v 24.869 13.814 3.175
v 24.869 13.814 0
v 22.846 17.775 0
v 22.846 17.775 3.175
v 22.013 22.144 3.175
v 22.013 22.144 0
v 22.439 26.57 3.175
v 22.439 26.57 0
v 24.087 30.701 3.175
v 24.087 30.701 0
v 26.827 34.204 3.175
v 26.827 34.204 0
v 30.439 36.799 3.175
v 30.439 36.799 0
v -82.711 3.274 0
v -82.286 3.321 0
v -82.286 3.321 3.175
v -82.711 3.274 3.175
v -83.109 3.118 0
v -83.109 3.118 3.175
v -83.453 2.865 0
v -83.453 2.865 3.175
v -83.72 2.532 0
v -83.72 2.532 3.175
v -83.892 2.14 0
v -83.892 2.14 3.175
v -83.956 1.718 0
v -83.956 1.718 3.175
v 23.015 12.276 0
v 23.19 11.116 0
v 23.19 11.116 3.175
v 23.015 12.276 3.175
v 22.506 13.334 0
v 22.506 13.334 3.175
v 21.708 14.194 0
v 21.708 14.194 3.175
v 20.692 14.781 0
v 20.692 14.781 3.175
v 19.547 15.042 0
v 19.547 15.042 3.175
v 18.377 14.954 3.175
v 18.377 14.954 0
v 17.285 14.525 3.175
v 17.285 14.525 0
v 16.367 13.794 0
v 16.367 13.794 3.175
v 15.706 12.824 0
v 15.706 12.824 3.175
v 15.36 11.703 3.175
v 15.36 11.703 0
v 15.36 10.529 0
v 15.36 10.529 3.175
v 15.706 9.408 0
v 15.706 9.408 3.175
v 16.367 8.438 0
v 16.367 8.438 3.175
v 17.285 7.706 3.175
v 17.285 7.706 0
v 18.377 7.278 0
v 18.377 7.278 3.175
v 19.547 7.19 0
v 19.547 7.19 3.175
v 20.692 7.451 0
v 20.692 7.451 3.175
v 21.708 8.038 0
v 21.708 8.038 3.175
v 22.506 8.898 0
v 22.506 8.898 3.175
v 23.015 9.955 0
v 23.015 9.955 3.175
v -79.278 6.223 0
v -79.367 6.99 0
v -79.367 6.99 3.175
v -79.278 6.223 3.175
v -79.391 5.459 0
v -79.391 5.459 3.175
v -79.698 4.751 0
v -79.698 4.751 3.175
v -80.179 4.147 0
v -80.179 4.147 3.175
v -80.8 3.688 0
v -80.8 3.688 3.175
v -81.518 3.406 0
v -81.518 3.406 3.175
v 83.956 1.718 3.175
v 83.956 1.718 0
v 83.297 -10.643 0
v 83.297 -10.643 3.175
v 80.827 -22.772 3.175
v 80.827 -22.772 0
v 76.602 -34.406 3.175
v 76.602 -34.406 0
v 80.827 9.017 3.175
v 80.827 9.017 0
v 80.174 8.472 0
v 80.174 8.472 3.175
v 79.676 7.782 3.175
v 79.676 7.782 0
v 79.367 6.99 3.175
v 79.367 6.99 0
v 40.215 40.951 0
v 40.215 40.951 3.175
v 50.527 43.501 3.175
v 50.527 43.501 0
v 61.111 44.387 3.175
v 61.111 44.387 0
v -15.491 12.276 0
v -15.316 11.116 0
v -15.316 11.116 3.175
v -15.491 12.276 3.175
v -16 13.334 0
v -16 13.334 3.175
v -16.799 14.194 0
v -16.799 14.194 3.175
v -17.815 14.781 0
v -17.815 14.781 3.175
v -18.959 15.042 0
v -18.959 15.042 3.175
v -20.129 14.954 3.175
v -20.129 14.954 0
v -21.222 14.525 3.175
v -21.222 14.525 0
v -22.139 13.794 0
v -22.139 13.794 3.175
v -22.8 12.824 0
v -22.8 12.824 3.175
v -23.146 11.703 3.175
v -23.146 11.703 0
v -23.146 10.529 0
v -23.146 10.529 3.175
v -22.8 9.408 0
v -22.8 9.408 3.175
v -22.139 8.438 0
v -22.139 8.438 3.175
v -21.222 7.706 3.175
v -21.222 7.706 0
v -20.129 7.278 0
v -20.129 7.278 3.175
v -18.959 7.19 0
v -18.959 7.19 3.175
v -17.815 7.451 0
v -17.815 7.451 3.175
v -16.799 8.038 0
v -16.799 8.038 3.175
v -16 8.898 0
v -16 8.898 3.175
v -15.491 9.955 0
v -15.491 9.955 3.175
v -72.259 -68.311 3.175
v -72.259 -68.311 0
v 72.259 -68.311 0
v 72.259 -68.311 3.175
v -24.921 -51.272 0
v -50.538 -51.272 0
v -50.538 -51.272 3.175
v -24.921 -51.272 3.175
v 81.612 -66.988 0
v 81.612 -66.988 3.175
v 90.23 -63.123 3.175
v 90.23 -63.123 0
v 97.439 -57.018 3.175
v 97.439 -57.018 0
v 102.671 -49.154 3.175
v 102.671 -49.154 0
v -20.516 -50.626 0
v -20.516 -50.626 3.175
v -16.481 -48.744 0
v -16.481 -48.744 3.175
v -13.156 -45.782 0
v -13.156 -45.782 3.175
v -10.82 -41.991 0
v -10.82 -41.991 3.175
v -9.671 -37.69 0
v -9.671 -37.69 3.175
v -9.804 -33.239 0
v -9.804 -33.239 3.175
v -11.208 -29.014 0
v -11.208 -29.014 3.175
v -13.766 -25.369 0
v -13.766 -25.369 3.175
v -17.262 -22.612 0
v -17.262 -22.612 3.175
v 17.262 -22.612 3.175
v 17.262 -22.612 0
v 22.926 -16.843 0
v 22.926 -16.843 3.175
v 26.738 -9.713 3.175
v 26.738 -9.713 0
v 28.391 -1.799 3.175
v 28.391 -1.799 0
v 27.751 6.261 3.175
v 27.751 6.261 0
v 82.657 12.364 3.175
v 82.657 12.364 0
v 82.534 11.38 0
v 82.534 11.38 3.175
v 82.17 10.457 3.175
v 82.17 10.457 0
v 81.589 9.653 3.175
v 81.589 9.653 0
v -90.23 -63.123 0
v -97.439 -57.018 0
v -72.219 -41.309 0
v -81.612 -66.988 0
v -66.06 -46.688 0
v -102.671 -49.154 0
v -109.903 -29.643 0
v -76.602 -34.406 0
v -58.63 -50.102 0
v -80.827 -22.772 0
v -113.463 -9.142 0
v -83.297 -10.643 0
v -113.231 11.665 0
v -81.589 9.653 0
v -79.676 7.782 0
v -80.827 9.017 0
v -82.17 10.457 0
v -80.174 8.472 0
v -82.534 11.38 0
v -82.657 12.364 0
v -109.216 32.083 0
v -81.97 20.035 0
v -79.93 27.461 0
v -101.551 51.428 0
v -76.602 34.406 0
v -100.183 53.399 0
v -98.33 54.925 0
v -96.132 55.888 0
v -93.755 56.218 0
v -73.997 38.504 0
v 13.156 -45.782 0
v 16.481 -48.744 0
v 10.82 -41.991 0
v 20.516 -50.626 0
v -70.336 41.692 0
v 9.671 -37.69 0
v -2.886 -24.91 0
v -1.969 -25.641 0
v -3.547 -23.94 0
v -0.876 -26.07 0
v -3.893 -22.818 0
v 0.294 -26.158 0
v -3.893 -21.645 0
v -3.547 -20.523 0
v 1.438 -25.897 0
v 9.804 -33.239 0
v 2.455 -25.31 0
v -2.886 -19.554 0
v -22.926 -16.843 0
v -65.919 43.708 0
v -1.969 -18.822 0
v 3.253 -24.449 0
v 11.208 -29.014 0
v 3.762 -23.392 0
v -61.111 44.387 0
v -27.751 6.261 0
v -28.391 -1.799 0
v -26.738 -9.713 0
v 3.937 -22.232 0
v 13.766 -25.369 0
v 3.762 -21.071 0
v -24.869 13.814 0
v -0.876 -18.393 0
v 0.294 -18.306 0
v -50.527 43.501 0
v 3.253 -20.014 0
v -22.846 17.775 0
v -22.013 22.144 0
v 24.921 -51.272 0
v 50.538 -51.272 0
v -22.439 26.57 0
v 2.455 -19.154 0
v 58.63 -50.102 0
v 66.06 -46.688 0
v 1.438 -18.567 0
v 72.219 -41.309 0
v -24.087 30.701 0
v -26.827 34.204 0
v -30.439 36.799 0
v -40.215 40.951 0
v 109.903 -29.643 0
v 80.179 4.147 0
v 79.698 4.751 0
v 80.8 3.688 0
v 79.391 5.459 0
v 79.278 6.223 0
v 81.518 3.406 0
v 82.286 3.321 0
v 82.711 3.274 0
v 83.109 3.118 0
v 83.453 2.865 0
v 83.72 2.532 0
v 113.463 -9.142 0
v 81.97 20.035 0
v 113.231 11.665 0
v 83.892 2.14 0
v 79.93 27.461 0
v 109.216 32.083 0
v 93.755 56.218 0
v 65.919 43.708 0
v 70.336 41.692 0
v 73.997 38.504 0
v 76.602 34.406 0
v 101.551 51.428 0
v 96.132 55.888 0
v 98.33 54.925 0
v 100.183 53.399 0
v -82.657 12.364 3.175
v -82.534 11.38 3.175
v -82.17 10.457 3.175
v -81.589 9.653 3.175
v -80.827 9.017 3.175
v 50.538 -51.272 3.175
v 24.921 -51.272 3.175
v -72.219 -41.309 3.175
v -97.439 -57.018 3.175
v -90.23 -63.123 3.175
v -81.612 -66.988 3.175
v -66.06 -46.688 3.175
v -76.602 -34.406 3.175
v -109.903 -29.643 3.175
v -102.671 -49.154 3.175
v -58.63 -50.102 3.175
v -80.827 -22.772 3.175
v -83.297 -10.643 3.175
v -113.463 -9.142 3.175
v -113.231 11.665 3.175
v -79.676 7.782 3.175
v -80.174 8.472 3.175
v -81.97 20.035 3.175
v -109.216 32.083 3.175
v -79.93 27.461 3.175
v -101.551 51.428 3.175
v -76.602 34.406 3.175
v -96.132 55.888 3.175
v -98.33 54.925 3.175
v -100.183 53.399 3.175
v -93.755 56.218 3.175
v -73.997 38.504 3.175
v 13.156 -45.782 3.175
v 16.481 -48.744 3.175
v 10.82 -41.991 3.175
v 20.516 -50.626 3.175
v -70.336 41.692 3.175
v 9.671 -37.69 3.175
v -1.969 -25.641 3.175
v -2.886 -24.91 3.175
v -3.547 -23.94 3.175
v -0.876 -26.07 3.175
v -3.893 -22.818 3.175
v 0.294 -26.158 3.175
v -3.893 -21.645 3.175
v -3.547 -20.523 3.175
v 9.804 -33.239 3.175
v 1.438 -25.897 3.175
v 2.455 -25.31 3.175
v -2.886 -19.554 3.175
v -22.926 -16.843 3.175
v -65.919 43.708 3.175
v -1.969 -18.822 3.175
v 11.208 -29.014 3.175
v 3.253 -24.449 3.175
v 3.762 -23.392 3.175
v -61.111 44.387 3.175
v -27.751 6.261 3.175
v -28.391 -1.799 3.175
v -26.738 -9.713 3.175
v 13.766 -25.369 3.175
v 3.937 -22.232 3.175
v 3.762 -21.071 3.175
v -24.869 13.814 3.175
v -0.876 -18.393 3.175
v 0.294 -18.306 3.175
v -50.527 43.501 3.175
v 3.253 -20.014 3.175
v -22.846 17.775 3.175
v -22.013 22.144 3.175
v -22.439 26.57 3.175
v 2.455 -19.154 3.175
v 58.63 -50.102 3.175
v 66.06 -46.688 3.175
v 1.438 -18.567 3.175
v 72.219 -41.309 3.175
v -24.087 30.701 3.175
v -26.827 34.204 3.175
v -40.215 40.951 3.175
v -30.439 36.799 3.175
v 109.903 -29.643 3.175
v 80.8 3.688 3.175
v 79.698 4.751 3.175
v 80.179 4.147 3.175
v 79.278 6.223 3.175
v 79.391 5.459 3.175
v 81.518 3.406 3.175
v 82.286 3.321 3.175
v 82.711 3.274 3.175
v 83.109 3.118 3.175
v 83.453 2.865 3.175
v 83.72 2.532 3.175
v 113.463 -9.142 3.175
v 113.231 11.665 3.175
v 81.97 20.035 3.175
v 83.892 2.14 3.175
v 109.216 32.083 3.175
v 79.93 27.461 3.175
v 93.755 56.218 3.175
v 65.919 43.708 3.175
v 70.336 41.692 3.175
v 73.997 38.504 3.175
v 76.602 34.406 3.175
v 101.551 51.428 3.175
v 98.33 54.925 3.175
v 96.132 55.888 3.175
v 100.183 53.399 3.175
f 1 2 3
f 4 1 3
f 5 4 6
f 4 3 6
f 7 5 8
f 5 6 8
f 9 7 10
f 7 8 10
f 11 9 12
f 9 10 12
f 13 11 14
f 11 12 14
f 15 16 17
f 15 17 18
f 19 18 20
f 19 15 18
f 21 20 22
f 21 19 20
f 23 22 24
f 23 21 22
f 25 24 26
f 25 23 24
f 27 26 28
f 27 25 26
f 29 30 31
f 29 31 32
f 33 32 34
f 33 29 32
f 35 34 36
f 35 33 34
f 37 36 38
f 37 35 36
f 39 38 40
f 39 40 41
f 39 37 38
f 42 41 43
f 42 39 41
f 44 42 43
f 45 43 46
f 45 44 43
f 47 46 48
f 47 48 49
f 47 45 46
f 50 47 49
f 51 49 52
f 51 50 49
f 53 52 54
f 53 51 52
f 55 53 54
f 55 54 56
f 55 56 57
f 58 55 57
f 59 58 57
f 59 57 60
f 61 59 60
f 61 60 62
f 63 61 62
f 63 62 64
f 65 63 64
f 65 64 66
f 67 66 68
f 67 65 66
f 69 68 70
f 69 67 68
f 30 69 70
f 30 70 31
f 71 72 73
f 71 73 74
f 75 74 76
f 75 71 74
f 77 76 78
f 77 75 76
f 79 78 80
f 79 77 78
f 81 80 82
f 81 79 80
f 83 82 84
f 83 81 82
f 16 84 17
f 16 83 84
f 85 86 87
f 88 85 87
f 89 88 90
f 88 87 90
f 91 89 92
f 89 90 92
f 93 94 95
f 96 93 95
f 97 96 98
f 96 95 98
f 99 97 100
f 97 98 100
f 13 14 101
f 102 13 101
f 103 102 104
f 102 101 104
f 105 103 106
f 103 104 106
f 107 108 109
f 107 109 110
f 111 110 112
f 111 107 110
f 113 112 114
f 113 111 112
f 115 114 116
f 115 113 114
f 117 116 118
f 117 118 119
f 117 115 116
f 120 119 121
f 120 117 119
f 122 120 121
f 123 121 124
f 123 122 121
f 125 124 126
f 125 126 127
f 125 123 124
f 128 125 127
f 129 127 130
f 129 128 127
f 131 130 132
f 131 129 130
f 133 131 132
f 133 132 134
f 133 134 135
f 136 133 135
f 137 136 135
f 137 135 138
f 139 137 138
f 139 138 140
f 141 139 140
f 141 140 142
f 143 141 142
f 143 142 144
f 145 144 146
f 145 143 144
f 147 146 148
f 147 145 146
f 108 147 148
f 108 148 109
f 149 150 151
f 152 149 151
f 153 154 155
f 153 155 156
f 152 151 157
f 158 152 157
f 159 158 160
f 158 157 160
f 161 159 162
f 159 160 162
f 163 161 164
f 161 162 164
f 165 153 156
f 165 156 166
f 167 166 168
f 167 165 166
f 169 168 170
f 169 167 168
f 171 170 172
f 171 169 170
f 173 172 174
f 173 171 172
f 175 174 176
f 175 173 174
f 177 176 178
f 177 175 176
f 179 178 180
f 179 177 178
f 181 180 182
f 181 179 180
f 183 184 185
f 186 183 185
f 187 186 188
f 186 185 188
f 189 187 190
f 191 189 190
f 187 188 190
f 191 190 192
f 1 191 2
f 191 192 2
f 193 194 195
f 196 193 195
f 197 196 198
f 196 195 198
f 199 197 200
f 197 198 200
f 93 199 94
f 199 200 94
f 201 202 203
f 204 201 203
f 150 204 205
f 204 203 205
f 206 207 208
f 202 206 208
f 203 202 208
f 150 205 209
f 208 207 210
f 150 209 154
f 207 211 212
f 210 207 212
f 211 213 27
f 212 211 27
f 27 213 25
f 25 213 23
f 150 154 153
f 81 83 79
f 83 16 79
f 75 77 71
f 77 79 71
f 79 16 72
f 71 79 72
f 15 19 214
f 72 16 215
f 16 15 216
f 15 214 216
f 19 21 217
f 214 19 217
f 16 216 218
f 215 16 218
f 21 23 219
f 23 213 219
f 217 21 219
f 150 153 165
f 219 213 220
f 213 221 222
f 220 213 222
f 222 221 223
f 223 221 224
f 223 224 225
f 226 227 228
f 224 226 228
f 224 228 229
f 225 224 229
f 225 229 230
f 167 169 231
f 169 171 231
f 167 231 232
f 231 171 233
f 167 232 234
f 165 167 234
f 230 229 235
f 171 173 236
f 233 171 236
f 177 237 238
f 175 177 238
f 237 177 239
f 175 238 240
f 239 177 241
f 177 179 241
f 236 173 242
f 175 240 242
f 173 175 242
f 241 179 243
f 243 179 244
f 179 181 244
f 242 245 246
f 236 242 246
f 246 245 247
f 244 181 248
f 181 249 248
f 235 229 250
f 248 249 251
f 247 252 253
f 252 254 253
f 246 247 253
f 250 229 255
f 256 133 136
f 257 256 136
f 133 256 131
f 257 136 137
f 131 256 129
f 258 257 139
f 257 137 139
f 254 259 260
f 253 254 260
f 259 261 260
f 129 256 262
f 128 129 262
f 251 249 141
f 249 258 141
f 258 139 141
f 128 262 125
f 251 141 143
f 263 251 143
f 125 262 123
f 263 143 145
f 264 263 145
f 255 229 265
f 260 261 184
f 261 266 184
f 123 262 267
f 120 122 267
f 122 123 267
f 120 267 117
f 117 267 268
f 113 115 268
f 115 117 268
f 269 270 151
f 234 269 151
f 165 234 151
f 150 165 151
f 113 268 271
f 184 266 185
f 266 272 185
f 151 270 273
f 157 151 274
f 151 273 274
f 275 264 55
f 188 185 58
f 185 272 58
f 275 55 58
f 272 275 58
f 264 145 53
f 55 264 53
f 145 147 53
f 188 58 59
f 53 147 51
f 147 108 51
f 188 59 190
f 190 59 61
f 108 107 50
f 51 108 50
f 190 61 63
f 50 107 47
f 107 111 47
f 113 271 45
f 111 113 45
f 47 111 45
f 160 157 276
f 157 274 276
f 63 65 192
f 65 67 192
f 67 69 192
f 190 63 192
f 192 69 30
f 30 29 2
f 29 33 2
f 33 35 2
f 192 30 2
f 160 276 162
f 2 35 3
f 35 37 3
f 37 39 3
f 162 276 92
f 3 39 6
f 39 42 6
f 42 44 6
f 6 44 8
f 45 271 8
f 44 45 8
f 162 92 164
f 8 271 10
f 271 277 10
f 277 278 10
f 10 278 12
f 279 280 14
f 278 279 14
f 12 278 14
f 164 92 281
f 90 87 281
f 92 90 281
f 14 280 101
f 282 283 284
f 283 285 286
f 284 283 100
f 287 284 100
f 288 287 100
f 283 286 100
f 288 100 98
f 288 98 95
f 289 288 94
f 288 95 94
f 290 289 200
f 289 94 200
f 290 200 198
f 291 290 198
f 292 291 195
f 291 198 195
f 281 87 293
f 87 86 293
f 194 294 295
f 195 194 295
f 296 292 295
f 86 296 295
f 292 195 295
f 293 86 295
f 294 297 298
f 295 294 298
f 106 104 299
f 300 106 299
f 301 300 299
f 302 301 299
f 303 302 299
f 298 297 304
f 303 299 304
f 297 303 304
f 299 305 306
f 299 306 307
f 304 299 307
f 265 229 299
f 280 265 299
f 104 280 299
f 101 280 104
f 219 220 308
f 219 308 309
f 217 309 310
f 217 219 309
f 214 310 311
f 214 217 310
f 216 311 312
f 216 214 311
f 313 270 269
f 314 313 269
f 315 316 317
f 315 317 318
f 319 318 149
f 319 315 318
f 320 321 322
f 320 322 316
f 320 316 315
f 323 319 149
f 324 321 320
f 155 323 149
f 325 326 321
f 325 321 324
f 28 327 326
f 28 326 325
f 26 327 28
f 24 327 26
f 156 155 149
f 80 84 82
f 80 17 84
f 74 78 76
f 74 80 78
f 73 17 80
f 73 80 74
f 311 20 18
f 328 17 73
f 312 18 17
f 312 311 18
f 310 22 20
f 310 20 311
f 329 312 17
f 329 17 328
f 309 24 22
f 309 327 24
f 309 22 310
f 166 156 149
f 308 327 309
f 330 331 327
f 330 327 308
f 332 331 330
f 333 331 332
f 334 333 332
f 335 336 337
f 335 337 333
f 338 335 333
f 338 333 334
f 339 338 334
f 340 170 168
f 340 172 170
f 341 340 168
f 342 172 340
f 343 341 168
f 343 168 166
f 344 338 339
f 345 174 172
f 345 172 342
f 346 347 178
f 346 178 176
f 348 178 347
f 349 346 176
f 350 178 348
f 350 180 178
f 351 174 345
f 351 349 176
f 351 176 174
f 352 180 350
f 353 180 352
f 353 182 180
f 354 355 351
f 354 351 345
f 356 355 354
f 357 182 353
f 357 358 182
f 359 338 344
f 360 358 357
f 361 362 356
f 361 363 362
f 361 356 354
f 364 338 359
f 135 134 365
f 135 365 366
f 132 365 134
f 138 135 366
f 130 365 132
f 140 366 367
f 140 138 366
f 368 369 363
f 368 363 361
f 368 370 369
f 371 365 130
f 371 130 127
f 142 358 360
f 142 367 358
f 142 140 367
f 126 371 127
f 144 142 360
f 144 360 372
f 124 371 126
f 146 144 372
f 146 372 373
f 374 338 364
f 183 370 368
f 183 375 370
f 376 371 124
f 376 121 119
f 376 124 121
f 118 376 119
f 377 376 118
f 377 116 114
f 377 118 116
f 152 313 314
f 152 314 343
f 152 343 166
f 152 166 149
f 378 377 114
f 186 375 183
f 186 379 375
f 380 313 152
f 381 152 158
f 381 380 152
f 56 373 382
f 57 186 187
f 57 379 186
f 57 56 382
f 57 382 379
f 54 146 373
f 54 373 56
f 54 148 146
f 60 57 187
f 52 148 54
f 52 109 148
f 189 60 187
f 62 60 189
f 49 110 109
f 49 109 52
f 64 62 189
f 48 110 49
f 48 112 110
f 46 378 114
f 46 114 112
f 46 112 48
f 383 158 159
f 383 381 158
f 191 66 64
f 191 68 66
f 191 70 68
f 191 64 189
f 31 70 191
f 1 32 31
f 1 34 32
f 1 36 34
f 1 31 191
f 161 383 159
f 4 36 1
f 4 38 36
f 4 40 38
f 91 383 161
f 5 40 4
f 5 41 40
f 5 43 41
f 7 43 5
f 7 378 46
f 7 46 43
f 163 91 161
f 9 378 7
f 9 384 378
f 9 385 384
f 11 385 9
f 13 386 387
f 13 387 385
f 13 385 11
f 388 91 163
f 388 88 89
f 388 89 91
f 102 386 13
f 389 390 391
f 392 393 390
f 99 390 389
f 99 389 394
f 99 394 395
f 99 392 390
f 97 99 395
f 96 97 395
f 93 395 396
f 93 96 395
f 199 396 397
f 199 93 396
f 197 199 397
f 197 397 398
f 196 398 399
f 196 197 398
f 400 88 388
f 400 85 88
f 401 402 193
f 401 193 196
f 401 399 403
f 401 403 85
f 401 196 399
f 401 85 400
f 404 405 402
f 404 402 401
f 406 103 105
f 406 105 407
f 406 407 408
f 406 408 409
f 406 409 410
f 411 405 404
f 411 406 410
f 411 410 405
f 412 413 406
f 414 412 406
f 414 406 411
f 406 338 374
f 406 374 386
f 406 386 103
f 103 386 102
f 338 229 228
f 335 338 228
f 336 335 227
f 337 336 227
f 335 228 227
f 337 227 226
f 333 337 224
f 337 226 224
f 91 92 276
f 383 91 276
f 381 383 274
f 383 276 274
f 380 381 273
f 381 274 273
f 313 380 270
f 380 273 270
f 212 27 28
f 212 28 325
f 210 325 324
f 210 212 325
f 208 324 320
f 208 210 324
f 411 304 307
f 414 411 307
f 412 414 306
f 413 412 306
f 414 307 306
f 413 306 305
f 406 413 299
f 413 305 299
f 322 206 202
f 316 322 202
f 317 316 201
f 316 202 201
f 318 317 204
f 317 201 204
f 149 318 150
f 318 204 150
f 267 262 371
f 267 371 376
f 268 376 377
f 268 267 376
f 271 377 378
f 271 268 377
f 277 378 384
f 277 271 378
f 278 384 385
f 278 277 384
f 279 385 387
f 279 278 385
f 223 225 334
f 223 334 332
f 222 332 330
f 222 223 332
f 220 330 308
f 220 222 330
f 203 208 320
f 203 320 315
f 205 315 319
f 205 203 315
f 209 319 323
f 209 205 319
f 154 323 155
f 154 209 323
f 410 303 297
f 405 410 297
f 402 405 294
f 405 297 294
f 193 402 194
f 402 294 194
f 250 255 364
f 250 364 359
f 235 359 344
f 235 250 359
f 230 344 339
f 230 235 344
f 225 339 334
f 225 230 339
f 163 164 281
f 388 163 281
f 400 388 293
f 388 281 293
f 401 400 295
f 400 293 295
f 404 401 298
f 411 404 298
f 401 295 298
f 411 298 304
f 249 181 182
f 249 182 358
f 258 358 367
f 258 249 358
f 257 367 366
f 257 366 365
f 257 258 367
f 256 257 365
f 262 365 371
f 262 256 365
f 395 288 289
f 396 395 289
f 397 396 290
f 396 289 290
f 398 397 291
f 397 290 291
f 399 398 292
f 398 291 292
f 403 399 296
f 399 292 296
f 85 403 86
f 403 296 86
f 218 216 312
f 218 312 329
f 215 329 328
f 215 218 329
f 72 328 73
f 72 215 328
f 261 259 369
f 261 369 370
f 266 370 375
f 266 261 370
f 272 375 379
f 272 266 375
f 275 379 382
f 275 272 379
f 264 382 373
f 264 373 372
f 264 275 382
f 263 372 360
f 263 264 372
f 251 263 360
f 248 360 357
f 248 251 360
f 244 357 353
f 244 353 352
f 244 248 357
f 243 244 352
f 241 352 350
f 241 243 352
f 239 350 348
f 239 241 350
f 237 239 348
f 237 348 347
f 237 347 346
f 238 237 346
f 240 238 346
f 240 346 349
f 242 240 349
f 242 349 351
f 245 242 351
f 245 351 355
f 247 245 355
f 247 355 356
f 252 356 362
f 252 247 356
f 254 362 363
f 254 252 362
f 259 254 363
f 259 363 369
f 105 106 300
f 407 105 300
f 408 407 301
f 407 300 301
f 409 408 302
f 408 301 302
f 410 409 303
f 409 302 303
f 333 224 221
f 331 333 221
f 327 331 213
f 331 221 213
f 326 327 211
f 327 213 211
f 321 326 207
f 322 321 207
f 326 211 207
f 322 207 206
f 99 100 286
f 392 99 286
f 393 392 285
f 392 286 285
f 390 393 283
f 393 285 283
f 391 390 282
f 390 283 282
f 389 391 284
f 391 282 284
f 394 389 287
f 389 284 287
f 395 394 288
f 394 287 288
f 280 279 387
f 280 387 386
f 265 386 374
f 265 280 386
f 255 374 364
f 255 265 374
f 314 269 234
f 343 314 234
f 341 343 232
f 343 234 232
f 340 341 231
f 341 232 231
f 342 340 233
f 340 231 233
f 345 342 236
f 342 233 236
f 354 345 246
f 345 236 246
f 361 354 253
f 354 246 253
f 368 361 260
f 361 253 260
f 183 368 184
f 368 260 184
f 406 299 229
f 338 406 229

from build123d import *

# Parameters (mm, degrees)
SKETCH1_R           = 3.937
BOSS_EXTRUDE1_DEPTH = 3.175


with BuildPart() as part:
    # Sketch1 → Boss-Extrude1 (new body)
    with BuildSketch(Plane.XY):
        with BuildLine():
            Line((93.755372783, 56.217862378), (-93.755372783, 56.217862378))
            ThreePointArc((-93.755372783, 56.217862378), (-98.330168366, 54.924590712), (-101.550779975, 51.427596704))
            ThreePointArc((-101.550779975, 51.427596704), (-113.823339918, 1.267243548), (-102.670596612, -49.153913451))
            ThreePointArc((-102.670596612, -49.153913451), (-90.230339267, -63.122833424), (-72.258999564, -68.311443769))
            Line((-72.258999564, -68.311443769), (72.258999564, -68.311443769))
            ThreePointArc((72.258999564, -68.311443769), (90.230339267, -63.122833424), (102.670596612, -49.153913451))
            ThreePointArc((102.670596612, -49.153913451), (113.823339918, 1.267243548), (101.550779975, 51.427596704))
            ThreePointArc((101.550779975, 51.427596704), (98.330168366, 54.924590712), (93.755372783, 56.217862378))
        make_face()
        with Locations((0, -22.231680406)):
            Circle(SKETCH1_R, mode=Mode.SUBTRACT)
        with Locations((-19.2532, 11.115840203)):
            Circle(SKETCH1_R, mode=Mode.SUBTRACT)
        with Locations((19.2532, 11.115840203)):
            Circle(SKETCH1_R, mode=Mode.SUBTRACT)
        with BuildLine():
            Line((50.537610963, -51.271802519), (24.921430241, -51.271802519))
            ThreePointArc((24.921430241, -51.271802519), (10.088644213, -39.88245969), (17.262248757, -22.612020516))
            ThreePointArc((17.262248757, -22.612020516), (27.847341492, -5.815004372), (24.868702617, 13.81435247))
            ThreePointArc((24.868702617, 13.81435247), (22.438574631, 26.570482702), (30.438512771, 36.799137076))
            ThreePointArc((30.438512771, 36.799137076), (45.320271887, 42.430959459), (61.111403686, 44.386549975))
            ThreePointArc((61.111403686, 44.386549975), (70.335617903, 41.69195489), (76.601720977, 34.406152063))
            ThreePointArc((76.601720977, 34.406152063), (81.115925355, 23.793617751), (82.657376867, 12.364363491))
            ThreePointArc((82.657376867, 12.364363491), (82.169800307, 10.456907156), (80.826687149, 9.017404598))
            ThreePointArc((80.826687149, 9.017404598), (79.903262527, 8.142769936), (79.366676242, 6.98961167))
            ThreePointArc((79.366676242, 6.98961167), (79.918421039, 4.432989113), (82.285769804, 3.321053391))
            ThreePointArc((82.285769804, 3.321053391), (83.453127799, 2.865261142), (83.956280763, 1.717520598))
            ThreePointArc((83.956280763, 1.717520598), (82.285769804, -16.752881668), (76.601720977, -34.406152063))
            ThreePointArc((76.601720977, -34.406152063), (66.06007852, -46.687651069), (50.537610963, -51.271802519))
        make_face(mode=Mode.SUBTRACT)
        with BuildLine():
            Line((-50.537610963, -51.271802519), (-24.921430241, -51.271802519))
            ThreePointArc((-24.921430241, -51.271802519), (-10.088644213, -39.88245969), (-17.262248757, -22.612020516))
            ThreePointArc((-17.262248757, -22.612020516), (-27.847341492, -5.815004372), (-24.868702617, 13.81435247))
            ThreePointArc((-24.868702617, 13.81435247), (-22.438574631, 26.570482702), (-30.438512771, 36.799137076))
            ThreePointArc((-30.438512771, 36.799137076), (-45.320271887, 42.430959459), (-61.111403686, 44.386549975))
            ThreePointArc((-61.111403686, 44.386549975), (-70.335617903, 41.69195489), (-76.601720977, 34.406152063))
            ThreePointArc((-76.601720977, 34.406152063), (-81.115925355, 23.793617751), (-82.657376867, 12.364363491))
            ThreePointArc((-82.657376867, 12.364363491), (-82.169800307, 10.456907156), (-80.826687149, 9.017404598))
            ThreePointArc((-80.826687149, 9.017404598), (-79.903262527, 8.142769936), (-79.366676242, 6.98961167))
            ThreePointArc((-79.366676242, 6.98961167), (-79.918421039, 4.432989113), (-82.285769804, 3.321053391))
            ThreePointArc((-82.285769804, 3.321053391), (-83.453127799, 2.865261142), (-83.956280763, 1.717520598))
            ThreePointArc((-83.956280763, 1.717520598), (-82.285769804, -16.752881668), (-76.601720977, -34.406152063))
            ThreePointArc((-76.601720977, -34.406152063), (-66.06007852, -46.687651069), (-50.537610963, -51.271802519))
        make_face(mode=Mode.SUBTRACT)
    extrude(amount=BOSS_EXTRUDE1_DEPTH)


solid = part.part
